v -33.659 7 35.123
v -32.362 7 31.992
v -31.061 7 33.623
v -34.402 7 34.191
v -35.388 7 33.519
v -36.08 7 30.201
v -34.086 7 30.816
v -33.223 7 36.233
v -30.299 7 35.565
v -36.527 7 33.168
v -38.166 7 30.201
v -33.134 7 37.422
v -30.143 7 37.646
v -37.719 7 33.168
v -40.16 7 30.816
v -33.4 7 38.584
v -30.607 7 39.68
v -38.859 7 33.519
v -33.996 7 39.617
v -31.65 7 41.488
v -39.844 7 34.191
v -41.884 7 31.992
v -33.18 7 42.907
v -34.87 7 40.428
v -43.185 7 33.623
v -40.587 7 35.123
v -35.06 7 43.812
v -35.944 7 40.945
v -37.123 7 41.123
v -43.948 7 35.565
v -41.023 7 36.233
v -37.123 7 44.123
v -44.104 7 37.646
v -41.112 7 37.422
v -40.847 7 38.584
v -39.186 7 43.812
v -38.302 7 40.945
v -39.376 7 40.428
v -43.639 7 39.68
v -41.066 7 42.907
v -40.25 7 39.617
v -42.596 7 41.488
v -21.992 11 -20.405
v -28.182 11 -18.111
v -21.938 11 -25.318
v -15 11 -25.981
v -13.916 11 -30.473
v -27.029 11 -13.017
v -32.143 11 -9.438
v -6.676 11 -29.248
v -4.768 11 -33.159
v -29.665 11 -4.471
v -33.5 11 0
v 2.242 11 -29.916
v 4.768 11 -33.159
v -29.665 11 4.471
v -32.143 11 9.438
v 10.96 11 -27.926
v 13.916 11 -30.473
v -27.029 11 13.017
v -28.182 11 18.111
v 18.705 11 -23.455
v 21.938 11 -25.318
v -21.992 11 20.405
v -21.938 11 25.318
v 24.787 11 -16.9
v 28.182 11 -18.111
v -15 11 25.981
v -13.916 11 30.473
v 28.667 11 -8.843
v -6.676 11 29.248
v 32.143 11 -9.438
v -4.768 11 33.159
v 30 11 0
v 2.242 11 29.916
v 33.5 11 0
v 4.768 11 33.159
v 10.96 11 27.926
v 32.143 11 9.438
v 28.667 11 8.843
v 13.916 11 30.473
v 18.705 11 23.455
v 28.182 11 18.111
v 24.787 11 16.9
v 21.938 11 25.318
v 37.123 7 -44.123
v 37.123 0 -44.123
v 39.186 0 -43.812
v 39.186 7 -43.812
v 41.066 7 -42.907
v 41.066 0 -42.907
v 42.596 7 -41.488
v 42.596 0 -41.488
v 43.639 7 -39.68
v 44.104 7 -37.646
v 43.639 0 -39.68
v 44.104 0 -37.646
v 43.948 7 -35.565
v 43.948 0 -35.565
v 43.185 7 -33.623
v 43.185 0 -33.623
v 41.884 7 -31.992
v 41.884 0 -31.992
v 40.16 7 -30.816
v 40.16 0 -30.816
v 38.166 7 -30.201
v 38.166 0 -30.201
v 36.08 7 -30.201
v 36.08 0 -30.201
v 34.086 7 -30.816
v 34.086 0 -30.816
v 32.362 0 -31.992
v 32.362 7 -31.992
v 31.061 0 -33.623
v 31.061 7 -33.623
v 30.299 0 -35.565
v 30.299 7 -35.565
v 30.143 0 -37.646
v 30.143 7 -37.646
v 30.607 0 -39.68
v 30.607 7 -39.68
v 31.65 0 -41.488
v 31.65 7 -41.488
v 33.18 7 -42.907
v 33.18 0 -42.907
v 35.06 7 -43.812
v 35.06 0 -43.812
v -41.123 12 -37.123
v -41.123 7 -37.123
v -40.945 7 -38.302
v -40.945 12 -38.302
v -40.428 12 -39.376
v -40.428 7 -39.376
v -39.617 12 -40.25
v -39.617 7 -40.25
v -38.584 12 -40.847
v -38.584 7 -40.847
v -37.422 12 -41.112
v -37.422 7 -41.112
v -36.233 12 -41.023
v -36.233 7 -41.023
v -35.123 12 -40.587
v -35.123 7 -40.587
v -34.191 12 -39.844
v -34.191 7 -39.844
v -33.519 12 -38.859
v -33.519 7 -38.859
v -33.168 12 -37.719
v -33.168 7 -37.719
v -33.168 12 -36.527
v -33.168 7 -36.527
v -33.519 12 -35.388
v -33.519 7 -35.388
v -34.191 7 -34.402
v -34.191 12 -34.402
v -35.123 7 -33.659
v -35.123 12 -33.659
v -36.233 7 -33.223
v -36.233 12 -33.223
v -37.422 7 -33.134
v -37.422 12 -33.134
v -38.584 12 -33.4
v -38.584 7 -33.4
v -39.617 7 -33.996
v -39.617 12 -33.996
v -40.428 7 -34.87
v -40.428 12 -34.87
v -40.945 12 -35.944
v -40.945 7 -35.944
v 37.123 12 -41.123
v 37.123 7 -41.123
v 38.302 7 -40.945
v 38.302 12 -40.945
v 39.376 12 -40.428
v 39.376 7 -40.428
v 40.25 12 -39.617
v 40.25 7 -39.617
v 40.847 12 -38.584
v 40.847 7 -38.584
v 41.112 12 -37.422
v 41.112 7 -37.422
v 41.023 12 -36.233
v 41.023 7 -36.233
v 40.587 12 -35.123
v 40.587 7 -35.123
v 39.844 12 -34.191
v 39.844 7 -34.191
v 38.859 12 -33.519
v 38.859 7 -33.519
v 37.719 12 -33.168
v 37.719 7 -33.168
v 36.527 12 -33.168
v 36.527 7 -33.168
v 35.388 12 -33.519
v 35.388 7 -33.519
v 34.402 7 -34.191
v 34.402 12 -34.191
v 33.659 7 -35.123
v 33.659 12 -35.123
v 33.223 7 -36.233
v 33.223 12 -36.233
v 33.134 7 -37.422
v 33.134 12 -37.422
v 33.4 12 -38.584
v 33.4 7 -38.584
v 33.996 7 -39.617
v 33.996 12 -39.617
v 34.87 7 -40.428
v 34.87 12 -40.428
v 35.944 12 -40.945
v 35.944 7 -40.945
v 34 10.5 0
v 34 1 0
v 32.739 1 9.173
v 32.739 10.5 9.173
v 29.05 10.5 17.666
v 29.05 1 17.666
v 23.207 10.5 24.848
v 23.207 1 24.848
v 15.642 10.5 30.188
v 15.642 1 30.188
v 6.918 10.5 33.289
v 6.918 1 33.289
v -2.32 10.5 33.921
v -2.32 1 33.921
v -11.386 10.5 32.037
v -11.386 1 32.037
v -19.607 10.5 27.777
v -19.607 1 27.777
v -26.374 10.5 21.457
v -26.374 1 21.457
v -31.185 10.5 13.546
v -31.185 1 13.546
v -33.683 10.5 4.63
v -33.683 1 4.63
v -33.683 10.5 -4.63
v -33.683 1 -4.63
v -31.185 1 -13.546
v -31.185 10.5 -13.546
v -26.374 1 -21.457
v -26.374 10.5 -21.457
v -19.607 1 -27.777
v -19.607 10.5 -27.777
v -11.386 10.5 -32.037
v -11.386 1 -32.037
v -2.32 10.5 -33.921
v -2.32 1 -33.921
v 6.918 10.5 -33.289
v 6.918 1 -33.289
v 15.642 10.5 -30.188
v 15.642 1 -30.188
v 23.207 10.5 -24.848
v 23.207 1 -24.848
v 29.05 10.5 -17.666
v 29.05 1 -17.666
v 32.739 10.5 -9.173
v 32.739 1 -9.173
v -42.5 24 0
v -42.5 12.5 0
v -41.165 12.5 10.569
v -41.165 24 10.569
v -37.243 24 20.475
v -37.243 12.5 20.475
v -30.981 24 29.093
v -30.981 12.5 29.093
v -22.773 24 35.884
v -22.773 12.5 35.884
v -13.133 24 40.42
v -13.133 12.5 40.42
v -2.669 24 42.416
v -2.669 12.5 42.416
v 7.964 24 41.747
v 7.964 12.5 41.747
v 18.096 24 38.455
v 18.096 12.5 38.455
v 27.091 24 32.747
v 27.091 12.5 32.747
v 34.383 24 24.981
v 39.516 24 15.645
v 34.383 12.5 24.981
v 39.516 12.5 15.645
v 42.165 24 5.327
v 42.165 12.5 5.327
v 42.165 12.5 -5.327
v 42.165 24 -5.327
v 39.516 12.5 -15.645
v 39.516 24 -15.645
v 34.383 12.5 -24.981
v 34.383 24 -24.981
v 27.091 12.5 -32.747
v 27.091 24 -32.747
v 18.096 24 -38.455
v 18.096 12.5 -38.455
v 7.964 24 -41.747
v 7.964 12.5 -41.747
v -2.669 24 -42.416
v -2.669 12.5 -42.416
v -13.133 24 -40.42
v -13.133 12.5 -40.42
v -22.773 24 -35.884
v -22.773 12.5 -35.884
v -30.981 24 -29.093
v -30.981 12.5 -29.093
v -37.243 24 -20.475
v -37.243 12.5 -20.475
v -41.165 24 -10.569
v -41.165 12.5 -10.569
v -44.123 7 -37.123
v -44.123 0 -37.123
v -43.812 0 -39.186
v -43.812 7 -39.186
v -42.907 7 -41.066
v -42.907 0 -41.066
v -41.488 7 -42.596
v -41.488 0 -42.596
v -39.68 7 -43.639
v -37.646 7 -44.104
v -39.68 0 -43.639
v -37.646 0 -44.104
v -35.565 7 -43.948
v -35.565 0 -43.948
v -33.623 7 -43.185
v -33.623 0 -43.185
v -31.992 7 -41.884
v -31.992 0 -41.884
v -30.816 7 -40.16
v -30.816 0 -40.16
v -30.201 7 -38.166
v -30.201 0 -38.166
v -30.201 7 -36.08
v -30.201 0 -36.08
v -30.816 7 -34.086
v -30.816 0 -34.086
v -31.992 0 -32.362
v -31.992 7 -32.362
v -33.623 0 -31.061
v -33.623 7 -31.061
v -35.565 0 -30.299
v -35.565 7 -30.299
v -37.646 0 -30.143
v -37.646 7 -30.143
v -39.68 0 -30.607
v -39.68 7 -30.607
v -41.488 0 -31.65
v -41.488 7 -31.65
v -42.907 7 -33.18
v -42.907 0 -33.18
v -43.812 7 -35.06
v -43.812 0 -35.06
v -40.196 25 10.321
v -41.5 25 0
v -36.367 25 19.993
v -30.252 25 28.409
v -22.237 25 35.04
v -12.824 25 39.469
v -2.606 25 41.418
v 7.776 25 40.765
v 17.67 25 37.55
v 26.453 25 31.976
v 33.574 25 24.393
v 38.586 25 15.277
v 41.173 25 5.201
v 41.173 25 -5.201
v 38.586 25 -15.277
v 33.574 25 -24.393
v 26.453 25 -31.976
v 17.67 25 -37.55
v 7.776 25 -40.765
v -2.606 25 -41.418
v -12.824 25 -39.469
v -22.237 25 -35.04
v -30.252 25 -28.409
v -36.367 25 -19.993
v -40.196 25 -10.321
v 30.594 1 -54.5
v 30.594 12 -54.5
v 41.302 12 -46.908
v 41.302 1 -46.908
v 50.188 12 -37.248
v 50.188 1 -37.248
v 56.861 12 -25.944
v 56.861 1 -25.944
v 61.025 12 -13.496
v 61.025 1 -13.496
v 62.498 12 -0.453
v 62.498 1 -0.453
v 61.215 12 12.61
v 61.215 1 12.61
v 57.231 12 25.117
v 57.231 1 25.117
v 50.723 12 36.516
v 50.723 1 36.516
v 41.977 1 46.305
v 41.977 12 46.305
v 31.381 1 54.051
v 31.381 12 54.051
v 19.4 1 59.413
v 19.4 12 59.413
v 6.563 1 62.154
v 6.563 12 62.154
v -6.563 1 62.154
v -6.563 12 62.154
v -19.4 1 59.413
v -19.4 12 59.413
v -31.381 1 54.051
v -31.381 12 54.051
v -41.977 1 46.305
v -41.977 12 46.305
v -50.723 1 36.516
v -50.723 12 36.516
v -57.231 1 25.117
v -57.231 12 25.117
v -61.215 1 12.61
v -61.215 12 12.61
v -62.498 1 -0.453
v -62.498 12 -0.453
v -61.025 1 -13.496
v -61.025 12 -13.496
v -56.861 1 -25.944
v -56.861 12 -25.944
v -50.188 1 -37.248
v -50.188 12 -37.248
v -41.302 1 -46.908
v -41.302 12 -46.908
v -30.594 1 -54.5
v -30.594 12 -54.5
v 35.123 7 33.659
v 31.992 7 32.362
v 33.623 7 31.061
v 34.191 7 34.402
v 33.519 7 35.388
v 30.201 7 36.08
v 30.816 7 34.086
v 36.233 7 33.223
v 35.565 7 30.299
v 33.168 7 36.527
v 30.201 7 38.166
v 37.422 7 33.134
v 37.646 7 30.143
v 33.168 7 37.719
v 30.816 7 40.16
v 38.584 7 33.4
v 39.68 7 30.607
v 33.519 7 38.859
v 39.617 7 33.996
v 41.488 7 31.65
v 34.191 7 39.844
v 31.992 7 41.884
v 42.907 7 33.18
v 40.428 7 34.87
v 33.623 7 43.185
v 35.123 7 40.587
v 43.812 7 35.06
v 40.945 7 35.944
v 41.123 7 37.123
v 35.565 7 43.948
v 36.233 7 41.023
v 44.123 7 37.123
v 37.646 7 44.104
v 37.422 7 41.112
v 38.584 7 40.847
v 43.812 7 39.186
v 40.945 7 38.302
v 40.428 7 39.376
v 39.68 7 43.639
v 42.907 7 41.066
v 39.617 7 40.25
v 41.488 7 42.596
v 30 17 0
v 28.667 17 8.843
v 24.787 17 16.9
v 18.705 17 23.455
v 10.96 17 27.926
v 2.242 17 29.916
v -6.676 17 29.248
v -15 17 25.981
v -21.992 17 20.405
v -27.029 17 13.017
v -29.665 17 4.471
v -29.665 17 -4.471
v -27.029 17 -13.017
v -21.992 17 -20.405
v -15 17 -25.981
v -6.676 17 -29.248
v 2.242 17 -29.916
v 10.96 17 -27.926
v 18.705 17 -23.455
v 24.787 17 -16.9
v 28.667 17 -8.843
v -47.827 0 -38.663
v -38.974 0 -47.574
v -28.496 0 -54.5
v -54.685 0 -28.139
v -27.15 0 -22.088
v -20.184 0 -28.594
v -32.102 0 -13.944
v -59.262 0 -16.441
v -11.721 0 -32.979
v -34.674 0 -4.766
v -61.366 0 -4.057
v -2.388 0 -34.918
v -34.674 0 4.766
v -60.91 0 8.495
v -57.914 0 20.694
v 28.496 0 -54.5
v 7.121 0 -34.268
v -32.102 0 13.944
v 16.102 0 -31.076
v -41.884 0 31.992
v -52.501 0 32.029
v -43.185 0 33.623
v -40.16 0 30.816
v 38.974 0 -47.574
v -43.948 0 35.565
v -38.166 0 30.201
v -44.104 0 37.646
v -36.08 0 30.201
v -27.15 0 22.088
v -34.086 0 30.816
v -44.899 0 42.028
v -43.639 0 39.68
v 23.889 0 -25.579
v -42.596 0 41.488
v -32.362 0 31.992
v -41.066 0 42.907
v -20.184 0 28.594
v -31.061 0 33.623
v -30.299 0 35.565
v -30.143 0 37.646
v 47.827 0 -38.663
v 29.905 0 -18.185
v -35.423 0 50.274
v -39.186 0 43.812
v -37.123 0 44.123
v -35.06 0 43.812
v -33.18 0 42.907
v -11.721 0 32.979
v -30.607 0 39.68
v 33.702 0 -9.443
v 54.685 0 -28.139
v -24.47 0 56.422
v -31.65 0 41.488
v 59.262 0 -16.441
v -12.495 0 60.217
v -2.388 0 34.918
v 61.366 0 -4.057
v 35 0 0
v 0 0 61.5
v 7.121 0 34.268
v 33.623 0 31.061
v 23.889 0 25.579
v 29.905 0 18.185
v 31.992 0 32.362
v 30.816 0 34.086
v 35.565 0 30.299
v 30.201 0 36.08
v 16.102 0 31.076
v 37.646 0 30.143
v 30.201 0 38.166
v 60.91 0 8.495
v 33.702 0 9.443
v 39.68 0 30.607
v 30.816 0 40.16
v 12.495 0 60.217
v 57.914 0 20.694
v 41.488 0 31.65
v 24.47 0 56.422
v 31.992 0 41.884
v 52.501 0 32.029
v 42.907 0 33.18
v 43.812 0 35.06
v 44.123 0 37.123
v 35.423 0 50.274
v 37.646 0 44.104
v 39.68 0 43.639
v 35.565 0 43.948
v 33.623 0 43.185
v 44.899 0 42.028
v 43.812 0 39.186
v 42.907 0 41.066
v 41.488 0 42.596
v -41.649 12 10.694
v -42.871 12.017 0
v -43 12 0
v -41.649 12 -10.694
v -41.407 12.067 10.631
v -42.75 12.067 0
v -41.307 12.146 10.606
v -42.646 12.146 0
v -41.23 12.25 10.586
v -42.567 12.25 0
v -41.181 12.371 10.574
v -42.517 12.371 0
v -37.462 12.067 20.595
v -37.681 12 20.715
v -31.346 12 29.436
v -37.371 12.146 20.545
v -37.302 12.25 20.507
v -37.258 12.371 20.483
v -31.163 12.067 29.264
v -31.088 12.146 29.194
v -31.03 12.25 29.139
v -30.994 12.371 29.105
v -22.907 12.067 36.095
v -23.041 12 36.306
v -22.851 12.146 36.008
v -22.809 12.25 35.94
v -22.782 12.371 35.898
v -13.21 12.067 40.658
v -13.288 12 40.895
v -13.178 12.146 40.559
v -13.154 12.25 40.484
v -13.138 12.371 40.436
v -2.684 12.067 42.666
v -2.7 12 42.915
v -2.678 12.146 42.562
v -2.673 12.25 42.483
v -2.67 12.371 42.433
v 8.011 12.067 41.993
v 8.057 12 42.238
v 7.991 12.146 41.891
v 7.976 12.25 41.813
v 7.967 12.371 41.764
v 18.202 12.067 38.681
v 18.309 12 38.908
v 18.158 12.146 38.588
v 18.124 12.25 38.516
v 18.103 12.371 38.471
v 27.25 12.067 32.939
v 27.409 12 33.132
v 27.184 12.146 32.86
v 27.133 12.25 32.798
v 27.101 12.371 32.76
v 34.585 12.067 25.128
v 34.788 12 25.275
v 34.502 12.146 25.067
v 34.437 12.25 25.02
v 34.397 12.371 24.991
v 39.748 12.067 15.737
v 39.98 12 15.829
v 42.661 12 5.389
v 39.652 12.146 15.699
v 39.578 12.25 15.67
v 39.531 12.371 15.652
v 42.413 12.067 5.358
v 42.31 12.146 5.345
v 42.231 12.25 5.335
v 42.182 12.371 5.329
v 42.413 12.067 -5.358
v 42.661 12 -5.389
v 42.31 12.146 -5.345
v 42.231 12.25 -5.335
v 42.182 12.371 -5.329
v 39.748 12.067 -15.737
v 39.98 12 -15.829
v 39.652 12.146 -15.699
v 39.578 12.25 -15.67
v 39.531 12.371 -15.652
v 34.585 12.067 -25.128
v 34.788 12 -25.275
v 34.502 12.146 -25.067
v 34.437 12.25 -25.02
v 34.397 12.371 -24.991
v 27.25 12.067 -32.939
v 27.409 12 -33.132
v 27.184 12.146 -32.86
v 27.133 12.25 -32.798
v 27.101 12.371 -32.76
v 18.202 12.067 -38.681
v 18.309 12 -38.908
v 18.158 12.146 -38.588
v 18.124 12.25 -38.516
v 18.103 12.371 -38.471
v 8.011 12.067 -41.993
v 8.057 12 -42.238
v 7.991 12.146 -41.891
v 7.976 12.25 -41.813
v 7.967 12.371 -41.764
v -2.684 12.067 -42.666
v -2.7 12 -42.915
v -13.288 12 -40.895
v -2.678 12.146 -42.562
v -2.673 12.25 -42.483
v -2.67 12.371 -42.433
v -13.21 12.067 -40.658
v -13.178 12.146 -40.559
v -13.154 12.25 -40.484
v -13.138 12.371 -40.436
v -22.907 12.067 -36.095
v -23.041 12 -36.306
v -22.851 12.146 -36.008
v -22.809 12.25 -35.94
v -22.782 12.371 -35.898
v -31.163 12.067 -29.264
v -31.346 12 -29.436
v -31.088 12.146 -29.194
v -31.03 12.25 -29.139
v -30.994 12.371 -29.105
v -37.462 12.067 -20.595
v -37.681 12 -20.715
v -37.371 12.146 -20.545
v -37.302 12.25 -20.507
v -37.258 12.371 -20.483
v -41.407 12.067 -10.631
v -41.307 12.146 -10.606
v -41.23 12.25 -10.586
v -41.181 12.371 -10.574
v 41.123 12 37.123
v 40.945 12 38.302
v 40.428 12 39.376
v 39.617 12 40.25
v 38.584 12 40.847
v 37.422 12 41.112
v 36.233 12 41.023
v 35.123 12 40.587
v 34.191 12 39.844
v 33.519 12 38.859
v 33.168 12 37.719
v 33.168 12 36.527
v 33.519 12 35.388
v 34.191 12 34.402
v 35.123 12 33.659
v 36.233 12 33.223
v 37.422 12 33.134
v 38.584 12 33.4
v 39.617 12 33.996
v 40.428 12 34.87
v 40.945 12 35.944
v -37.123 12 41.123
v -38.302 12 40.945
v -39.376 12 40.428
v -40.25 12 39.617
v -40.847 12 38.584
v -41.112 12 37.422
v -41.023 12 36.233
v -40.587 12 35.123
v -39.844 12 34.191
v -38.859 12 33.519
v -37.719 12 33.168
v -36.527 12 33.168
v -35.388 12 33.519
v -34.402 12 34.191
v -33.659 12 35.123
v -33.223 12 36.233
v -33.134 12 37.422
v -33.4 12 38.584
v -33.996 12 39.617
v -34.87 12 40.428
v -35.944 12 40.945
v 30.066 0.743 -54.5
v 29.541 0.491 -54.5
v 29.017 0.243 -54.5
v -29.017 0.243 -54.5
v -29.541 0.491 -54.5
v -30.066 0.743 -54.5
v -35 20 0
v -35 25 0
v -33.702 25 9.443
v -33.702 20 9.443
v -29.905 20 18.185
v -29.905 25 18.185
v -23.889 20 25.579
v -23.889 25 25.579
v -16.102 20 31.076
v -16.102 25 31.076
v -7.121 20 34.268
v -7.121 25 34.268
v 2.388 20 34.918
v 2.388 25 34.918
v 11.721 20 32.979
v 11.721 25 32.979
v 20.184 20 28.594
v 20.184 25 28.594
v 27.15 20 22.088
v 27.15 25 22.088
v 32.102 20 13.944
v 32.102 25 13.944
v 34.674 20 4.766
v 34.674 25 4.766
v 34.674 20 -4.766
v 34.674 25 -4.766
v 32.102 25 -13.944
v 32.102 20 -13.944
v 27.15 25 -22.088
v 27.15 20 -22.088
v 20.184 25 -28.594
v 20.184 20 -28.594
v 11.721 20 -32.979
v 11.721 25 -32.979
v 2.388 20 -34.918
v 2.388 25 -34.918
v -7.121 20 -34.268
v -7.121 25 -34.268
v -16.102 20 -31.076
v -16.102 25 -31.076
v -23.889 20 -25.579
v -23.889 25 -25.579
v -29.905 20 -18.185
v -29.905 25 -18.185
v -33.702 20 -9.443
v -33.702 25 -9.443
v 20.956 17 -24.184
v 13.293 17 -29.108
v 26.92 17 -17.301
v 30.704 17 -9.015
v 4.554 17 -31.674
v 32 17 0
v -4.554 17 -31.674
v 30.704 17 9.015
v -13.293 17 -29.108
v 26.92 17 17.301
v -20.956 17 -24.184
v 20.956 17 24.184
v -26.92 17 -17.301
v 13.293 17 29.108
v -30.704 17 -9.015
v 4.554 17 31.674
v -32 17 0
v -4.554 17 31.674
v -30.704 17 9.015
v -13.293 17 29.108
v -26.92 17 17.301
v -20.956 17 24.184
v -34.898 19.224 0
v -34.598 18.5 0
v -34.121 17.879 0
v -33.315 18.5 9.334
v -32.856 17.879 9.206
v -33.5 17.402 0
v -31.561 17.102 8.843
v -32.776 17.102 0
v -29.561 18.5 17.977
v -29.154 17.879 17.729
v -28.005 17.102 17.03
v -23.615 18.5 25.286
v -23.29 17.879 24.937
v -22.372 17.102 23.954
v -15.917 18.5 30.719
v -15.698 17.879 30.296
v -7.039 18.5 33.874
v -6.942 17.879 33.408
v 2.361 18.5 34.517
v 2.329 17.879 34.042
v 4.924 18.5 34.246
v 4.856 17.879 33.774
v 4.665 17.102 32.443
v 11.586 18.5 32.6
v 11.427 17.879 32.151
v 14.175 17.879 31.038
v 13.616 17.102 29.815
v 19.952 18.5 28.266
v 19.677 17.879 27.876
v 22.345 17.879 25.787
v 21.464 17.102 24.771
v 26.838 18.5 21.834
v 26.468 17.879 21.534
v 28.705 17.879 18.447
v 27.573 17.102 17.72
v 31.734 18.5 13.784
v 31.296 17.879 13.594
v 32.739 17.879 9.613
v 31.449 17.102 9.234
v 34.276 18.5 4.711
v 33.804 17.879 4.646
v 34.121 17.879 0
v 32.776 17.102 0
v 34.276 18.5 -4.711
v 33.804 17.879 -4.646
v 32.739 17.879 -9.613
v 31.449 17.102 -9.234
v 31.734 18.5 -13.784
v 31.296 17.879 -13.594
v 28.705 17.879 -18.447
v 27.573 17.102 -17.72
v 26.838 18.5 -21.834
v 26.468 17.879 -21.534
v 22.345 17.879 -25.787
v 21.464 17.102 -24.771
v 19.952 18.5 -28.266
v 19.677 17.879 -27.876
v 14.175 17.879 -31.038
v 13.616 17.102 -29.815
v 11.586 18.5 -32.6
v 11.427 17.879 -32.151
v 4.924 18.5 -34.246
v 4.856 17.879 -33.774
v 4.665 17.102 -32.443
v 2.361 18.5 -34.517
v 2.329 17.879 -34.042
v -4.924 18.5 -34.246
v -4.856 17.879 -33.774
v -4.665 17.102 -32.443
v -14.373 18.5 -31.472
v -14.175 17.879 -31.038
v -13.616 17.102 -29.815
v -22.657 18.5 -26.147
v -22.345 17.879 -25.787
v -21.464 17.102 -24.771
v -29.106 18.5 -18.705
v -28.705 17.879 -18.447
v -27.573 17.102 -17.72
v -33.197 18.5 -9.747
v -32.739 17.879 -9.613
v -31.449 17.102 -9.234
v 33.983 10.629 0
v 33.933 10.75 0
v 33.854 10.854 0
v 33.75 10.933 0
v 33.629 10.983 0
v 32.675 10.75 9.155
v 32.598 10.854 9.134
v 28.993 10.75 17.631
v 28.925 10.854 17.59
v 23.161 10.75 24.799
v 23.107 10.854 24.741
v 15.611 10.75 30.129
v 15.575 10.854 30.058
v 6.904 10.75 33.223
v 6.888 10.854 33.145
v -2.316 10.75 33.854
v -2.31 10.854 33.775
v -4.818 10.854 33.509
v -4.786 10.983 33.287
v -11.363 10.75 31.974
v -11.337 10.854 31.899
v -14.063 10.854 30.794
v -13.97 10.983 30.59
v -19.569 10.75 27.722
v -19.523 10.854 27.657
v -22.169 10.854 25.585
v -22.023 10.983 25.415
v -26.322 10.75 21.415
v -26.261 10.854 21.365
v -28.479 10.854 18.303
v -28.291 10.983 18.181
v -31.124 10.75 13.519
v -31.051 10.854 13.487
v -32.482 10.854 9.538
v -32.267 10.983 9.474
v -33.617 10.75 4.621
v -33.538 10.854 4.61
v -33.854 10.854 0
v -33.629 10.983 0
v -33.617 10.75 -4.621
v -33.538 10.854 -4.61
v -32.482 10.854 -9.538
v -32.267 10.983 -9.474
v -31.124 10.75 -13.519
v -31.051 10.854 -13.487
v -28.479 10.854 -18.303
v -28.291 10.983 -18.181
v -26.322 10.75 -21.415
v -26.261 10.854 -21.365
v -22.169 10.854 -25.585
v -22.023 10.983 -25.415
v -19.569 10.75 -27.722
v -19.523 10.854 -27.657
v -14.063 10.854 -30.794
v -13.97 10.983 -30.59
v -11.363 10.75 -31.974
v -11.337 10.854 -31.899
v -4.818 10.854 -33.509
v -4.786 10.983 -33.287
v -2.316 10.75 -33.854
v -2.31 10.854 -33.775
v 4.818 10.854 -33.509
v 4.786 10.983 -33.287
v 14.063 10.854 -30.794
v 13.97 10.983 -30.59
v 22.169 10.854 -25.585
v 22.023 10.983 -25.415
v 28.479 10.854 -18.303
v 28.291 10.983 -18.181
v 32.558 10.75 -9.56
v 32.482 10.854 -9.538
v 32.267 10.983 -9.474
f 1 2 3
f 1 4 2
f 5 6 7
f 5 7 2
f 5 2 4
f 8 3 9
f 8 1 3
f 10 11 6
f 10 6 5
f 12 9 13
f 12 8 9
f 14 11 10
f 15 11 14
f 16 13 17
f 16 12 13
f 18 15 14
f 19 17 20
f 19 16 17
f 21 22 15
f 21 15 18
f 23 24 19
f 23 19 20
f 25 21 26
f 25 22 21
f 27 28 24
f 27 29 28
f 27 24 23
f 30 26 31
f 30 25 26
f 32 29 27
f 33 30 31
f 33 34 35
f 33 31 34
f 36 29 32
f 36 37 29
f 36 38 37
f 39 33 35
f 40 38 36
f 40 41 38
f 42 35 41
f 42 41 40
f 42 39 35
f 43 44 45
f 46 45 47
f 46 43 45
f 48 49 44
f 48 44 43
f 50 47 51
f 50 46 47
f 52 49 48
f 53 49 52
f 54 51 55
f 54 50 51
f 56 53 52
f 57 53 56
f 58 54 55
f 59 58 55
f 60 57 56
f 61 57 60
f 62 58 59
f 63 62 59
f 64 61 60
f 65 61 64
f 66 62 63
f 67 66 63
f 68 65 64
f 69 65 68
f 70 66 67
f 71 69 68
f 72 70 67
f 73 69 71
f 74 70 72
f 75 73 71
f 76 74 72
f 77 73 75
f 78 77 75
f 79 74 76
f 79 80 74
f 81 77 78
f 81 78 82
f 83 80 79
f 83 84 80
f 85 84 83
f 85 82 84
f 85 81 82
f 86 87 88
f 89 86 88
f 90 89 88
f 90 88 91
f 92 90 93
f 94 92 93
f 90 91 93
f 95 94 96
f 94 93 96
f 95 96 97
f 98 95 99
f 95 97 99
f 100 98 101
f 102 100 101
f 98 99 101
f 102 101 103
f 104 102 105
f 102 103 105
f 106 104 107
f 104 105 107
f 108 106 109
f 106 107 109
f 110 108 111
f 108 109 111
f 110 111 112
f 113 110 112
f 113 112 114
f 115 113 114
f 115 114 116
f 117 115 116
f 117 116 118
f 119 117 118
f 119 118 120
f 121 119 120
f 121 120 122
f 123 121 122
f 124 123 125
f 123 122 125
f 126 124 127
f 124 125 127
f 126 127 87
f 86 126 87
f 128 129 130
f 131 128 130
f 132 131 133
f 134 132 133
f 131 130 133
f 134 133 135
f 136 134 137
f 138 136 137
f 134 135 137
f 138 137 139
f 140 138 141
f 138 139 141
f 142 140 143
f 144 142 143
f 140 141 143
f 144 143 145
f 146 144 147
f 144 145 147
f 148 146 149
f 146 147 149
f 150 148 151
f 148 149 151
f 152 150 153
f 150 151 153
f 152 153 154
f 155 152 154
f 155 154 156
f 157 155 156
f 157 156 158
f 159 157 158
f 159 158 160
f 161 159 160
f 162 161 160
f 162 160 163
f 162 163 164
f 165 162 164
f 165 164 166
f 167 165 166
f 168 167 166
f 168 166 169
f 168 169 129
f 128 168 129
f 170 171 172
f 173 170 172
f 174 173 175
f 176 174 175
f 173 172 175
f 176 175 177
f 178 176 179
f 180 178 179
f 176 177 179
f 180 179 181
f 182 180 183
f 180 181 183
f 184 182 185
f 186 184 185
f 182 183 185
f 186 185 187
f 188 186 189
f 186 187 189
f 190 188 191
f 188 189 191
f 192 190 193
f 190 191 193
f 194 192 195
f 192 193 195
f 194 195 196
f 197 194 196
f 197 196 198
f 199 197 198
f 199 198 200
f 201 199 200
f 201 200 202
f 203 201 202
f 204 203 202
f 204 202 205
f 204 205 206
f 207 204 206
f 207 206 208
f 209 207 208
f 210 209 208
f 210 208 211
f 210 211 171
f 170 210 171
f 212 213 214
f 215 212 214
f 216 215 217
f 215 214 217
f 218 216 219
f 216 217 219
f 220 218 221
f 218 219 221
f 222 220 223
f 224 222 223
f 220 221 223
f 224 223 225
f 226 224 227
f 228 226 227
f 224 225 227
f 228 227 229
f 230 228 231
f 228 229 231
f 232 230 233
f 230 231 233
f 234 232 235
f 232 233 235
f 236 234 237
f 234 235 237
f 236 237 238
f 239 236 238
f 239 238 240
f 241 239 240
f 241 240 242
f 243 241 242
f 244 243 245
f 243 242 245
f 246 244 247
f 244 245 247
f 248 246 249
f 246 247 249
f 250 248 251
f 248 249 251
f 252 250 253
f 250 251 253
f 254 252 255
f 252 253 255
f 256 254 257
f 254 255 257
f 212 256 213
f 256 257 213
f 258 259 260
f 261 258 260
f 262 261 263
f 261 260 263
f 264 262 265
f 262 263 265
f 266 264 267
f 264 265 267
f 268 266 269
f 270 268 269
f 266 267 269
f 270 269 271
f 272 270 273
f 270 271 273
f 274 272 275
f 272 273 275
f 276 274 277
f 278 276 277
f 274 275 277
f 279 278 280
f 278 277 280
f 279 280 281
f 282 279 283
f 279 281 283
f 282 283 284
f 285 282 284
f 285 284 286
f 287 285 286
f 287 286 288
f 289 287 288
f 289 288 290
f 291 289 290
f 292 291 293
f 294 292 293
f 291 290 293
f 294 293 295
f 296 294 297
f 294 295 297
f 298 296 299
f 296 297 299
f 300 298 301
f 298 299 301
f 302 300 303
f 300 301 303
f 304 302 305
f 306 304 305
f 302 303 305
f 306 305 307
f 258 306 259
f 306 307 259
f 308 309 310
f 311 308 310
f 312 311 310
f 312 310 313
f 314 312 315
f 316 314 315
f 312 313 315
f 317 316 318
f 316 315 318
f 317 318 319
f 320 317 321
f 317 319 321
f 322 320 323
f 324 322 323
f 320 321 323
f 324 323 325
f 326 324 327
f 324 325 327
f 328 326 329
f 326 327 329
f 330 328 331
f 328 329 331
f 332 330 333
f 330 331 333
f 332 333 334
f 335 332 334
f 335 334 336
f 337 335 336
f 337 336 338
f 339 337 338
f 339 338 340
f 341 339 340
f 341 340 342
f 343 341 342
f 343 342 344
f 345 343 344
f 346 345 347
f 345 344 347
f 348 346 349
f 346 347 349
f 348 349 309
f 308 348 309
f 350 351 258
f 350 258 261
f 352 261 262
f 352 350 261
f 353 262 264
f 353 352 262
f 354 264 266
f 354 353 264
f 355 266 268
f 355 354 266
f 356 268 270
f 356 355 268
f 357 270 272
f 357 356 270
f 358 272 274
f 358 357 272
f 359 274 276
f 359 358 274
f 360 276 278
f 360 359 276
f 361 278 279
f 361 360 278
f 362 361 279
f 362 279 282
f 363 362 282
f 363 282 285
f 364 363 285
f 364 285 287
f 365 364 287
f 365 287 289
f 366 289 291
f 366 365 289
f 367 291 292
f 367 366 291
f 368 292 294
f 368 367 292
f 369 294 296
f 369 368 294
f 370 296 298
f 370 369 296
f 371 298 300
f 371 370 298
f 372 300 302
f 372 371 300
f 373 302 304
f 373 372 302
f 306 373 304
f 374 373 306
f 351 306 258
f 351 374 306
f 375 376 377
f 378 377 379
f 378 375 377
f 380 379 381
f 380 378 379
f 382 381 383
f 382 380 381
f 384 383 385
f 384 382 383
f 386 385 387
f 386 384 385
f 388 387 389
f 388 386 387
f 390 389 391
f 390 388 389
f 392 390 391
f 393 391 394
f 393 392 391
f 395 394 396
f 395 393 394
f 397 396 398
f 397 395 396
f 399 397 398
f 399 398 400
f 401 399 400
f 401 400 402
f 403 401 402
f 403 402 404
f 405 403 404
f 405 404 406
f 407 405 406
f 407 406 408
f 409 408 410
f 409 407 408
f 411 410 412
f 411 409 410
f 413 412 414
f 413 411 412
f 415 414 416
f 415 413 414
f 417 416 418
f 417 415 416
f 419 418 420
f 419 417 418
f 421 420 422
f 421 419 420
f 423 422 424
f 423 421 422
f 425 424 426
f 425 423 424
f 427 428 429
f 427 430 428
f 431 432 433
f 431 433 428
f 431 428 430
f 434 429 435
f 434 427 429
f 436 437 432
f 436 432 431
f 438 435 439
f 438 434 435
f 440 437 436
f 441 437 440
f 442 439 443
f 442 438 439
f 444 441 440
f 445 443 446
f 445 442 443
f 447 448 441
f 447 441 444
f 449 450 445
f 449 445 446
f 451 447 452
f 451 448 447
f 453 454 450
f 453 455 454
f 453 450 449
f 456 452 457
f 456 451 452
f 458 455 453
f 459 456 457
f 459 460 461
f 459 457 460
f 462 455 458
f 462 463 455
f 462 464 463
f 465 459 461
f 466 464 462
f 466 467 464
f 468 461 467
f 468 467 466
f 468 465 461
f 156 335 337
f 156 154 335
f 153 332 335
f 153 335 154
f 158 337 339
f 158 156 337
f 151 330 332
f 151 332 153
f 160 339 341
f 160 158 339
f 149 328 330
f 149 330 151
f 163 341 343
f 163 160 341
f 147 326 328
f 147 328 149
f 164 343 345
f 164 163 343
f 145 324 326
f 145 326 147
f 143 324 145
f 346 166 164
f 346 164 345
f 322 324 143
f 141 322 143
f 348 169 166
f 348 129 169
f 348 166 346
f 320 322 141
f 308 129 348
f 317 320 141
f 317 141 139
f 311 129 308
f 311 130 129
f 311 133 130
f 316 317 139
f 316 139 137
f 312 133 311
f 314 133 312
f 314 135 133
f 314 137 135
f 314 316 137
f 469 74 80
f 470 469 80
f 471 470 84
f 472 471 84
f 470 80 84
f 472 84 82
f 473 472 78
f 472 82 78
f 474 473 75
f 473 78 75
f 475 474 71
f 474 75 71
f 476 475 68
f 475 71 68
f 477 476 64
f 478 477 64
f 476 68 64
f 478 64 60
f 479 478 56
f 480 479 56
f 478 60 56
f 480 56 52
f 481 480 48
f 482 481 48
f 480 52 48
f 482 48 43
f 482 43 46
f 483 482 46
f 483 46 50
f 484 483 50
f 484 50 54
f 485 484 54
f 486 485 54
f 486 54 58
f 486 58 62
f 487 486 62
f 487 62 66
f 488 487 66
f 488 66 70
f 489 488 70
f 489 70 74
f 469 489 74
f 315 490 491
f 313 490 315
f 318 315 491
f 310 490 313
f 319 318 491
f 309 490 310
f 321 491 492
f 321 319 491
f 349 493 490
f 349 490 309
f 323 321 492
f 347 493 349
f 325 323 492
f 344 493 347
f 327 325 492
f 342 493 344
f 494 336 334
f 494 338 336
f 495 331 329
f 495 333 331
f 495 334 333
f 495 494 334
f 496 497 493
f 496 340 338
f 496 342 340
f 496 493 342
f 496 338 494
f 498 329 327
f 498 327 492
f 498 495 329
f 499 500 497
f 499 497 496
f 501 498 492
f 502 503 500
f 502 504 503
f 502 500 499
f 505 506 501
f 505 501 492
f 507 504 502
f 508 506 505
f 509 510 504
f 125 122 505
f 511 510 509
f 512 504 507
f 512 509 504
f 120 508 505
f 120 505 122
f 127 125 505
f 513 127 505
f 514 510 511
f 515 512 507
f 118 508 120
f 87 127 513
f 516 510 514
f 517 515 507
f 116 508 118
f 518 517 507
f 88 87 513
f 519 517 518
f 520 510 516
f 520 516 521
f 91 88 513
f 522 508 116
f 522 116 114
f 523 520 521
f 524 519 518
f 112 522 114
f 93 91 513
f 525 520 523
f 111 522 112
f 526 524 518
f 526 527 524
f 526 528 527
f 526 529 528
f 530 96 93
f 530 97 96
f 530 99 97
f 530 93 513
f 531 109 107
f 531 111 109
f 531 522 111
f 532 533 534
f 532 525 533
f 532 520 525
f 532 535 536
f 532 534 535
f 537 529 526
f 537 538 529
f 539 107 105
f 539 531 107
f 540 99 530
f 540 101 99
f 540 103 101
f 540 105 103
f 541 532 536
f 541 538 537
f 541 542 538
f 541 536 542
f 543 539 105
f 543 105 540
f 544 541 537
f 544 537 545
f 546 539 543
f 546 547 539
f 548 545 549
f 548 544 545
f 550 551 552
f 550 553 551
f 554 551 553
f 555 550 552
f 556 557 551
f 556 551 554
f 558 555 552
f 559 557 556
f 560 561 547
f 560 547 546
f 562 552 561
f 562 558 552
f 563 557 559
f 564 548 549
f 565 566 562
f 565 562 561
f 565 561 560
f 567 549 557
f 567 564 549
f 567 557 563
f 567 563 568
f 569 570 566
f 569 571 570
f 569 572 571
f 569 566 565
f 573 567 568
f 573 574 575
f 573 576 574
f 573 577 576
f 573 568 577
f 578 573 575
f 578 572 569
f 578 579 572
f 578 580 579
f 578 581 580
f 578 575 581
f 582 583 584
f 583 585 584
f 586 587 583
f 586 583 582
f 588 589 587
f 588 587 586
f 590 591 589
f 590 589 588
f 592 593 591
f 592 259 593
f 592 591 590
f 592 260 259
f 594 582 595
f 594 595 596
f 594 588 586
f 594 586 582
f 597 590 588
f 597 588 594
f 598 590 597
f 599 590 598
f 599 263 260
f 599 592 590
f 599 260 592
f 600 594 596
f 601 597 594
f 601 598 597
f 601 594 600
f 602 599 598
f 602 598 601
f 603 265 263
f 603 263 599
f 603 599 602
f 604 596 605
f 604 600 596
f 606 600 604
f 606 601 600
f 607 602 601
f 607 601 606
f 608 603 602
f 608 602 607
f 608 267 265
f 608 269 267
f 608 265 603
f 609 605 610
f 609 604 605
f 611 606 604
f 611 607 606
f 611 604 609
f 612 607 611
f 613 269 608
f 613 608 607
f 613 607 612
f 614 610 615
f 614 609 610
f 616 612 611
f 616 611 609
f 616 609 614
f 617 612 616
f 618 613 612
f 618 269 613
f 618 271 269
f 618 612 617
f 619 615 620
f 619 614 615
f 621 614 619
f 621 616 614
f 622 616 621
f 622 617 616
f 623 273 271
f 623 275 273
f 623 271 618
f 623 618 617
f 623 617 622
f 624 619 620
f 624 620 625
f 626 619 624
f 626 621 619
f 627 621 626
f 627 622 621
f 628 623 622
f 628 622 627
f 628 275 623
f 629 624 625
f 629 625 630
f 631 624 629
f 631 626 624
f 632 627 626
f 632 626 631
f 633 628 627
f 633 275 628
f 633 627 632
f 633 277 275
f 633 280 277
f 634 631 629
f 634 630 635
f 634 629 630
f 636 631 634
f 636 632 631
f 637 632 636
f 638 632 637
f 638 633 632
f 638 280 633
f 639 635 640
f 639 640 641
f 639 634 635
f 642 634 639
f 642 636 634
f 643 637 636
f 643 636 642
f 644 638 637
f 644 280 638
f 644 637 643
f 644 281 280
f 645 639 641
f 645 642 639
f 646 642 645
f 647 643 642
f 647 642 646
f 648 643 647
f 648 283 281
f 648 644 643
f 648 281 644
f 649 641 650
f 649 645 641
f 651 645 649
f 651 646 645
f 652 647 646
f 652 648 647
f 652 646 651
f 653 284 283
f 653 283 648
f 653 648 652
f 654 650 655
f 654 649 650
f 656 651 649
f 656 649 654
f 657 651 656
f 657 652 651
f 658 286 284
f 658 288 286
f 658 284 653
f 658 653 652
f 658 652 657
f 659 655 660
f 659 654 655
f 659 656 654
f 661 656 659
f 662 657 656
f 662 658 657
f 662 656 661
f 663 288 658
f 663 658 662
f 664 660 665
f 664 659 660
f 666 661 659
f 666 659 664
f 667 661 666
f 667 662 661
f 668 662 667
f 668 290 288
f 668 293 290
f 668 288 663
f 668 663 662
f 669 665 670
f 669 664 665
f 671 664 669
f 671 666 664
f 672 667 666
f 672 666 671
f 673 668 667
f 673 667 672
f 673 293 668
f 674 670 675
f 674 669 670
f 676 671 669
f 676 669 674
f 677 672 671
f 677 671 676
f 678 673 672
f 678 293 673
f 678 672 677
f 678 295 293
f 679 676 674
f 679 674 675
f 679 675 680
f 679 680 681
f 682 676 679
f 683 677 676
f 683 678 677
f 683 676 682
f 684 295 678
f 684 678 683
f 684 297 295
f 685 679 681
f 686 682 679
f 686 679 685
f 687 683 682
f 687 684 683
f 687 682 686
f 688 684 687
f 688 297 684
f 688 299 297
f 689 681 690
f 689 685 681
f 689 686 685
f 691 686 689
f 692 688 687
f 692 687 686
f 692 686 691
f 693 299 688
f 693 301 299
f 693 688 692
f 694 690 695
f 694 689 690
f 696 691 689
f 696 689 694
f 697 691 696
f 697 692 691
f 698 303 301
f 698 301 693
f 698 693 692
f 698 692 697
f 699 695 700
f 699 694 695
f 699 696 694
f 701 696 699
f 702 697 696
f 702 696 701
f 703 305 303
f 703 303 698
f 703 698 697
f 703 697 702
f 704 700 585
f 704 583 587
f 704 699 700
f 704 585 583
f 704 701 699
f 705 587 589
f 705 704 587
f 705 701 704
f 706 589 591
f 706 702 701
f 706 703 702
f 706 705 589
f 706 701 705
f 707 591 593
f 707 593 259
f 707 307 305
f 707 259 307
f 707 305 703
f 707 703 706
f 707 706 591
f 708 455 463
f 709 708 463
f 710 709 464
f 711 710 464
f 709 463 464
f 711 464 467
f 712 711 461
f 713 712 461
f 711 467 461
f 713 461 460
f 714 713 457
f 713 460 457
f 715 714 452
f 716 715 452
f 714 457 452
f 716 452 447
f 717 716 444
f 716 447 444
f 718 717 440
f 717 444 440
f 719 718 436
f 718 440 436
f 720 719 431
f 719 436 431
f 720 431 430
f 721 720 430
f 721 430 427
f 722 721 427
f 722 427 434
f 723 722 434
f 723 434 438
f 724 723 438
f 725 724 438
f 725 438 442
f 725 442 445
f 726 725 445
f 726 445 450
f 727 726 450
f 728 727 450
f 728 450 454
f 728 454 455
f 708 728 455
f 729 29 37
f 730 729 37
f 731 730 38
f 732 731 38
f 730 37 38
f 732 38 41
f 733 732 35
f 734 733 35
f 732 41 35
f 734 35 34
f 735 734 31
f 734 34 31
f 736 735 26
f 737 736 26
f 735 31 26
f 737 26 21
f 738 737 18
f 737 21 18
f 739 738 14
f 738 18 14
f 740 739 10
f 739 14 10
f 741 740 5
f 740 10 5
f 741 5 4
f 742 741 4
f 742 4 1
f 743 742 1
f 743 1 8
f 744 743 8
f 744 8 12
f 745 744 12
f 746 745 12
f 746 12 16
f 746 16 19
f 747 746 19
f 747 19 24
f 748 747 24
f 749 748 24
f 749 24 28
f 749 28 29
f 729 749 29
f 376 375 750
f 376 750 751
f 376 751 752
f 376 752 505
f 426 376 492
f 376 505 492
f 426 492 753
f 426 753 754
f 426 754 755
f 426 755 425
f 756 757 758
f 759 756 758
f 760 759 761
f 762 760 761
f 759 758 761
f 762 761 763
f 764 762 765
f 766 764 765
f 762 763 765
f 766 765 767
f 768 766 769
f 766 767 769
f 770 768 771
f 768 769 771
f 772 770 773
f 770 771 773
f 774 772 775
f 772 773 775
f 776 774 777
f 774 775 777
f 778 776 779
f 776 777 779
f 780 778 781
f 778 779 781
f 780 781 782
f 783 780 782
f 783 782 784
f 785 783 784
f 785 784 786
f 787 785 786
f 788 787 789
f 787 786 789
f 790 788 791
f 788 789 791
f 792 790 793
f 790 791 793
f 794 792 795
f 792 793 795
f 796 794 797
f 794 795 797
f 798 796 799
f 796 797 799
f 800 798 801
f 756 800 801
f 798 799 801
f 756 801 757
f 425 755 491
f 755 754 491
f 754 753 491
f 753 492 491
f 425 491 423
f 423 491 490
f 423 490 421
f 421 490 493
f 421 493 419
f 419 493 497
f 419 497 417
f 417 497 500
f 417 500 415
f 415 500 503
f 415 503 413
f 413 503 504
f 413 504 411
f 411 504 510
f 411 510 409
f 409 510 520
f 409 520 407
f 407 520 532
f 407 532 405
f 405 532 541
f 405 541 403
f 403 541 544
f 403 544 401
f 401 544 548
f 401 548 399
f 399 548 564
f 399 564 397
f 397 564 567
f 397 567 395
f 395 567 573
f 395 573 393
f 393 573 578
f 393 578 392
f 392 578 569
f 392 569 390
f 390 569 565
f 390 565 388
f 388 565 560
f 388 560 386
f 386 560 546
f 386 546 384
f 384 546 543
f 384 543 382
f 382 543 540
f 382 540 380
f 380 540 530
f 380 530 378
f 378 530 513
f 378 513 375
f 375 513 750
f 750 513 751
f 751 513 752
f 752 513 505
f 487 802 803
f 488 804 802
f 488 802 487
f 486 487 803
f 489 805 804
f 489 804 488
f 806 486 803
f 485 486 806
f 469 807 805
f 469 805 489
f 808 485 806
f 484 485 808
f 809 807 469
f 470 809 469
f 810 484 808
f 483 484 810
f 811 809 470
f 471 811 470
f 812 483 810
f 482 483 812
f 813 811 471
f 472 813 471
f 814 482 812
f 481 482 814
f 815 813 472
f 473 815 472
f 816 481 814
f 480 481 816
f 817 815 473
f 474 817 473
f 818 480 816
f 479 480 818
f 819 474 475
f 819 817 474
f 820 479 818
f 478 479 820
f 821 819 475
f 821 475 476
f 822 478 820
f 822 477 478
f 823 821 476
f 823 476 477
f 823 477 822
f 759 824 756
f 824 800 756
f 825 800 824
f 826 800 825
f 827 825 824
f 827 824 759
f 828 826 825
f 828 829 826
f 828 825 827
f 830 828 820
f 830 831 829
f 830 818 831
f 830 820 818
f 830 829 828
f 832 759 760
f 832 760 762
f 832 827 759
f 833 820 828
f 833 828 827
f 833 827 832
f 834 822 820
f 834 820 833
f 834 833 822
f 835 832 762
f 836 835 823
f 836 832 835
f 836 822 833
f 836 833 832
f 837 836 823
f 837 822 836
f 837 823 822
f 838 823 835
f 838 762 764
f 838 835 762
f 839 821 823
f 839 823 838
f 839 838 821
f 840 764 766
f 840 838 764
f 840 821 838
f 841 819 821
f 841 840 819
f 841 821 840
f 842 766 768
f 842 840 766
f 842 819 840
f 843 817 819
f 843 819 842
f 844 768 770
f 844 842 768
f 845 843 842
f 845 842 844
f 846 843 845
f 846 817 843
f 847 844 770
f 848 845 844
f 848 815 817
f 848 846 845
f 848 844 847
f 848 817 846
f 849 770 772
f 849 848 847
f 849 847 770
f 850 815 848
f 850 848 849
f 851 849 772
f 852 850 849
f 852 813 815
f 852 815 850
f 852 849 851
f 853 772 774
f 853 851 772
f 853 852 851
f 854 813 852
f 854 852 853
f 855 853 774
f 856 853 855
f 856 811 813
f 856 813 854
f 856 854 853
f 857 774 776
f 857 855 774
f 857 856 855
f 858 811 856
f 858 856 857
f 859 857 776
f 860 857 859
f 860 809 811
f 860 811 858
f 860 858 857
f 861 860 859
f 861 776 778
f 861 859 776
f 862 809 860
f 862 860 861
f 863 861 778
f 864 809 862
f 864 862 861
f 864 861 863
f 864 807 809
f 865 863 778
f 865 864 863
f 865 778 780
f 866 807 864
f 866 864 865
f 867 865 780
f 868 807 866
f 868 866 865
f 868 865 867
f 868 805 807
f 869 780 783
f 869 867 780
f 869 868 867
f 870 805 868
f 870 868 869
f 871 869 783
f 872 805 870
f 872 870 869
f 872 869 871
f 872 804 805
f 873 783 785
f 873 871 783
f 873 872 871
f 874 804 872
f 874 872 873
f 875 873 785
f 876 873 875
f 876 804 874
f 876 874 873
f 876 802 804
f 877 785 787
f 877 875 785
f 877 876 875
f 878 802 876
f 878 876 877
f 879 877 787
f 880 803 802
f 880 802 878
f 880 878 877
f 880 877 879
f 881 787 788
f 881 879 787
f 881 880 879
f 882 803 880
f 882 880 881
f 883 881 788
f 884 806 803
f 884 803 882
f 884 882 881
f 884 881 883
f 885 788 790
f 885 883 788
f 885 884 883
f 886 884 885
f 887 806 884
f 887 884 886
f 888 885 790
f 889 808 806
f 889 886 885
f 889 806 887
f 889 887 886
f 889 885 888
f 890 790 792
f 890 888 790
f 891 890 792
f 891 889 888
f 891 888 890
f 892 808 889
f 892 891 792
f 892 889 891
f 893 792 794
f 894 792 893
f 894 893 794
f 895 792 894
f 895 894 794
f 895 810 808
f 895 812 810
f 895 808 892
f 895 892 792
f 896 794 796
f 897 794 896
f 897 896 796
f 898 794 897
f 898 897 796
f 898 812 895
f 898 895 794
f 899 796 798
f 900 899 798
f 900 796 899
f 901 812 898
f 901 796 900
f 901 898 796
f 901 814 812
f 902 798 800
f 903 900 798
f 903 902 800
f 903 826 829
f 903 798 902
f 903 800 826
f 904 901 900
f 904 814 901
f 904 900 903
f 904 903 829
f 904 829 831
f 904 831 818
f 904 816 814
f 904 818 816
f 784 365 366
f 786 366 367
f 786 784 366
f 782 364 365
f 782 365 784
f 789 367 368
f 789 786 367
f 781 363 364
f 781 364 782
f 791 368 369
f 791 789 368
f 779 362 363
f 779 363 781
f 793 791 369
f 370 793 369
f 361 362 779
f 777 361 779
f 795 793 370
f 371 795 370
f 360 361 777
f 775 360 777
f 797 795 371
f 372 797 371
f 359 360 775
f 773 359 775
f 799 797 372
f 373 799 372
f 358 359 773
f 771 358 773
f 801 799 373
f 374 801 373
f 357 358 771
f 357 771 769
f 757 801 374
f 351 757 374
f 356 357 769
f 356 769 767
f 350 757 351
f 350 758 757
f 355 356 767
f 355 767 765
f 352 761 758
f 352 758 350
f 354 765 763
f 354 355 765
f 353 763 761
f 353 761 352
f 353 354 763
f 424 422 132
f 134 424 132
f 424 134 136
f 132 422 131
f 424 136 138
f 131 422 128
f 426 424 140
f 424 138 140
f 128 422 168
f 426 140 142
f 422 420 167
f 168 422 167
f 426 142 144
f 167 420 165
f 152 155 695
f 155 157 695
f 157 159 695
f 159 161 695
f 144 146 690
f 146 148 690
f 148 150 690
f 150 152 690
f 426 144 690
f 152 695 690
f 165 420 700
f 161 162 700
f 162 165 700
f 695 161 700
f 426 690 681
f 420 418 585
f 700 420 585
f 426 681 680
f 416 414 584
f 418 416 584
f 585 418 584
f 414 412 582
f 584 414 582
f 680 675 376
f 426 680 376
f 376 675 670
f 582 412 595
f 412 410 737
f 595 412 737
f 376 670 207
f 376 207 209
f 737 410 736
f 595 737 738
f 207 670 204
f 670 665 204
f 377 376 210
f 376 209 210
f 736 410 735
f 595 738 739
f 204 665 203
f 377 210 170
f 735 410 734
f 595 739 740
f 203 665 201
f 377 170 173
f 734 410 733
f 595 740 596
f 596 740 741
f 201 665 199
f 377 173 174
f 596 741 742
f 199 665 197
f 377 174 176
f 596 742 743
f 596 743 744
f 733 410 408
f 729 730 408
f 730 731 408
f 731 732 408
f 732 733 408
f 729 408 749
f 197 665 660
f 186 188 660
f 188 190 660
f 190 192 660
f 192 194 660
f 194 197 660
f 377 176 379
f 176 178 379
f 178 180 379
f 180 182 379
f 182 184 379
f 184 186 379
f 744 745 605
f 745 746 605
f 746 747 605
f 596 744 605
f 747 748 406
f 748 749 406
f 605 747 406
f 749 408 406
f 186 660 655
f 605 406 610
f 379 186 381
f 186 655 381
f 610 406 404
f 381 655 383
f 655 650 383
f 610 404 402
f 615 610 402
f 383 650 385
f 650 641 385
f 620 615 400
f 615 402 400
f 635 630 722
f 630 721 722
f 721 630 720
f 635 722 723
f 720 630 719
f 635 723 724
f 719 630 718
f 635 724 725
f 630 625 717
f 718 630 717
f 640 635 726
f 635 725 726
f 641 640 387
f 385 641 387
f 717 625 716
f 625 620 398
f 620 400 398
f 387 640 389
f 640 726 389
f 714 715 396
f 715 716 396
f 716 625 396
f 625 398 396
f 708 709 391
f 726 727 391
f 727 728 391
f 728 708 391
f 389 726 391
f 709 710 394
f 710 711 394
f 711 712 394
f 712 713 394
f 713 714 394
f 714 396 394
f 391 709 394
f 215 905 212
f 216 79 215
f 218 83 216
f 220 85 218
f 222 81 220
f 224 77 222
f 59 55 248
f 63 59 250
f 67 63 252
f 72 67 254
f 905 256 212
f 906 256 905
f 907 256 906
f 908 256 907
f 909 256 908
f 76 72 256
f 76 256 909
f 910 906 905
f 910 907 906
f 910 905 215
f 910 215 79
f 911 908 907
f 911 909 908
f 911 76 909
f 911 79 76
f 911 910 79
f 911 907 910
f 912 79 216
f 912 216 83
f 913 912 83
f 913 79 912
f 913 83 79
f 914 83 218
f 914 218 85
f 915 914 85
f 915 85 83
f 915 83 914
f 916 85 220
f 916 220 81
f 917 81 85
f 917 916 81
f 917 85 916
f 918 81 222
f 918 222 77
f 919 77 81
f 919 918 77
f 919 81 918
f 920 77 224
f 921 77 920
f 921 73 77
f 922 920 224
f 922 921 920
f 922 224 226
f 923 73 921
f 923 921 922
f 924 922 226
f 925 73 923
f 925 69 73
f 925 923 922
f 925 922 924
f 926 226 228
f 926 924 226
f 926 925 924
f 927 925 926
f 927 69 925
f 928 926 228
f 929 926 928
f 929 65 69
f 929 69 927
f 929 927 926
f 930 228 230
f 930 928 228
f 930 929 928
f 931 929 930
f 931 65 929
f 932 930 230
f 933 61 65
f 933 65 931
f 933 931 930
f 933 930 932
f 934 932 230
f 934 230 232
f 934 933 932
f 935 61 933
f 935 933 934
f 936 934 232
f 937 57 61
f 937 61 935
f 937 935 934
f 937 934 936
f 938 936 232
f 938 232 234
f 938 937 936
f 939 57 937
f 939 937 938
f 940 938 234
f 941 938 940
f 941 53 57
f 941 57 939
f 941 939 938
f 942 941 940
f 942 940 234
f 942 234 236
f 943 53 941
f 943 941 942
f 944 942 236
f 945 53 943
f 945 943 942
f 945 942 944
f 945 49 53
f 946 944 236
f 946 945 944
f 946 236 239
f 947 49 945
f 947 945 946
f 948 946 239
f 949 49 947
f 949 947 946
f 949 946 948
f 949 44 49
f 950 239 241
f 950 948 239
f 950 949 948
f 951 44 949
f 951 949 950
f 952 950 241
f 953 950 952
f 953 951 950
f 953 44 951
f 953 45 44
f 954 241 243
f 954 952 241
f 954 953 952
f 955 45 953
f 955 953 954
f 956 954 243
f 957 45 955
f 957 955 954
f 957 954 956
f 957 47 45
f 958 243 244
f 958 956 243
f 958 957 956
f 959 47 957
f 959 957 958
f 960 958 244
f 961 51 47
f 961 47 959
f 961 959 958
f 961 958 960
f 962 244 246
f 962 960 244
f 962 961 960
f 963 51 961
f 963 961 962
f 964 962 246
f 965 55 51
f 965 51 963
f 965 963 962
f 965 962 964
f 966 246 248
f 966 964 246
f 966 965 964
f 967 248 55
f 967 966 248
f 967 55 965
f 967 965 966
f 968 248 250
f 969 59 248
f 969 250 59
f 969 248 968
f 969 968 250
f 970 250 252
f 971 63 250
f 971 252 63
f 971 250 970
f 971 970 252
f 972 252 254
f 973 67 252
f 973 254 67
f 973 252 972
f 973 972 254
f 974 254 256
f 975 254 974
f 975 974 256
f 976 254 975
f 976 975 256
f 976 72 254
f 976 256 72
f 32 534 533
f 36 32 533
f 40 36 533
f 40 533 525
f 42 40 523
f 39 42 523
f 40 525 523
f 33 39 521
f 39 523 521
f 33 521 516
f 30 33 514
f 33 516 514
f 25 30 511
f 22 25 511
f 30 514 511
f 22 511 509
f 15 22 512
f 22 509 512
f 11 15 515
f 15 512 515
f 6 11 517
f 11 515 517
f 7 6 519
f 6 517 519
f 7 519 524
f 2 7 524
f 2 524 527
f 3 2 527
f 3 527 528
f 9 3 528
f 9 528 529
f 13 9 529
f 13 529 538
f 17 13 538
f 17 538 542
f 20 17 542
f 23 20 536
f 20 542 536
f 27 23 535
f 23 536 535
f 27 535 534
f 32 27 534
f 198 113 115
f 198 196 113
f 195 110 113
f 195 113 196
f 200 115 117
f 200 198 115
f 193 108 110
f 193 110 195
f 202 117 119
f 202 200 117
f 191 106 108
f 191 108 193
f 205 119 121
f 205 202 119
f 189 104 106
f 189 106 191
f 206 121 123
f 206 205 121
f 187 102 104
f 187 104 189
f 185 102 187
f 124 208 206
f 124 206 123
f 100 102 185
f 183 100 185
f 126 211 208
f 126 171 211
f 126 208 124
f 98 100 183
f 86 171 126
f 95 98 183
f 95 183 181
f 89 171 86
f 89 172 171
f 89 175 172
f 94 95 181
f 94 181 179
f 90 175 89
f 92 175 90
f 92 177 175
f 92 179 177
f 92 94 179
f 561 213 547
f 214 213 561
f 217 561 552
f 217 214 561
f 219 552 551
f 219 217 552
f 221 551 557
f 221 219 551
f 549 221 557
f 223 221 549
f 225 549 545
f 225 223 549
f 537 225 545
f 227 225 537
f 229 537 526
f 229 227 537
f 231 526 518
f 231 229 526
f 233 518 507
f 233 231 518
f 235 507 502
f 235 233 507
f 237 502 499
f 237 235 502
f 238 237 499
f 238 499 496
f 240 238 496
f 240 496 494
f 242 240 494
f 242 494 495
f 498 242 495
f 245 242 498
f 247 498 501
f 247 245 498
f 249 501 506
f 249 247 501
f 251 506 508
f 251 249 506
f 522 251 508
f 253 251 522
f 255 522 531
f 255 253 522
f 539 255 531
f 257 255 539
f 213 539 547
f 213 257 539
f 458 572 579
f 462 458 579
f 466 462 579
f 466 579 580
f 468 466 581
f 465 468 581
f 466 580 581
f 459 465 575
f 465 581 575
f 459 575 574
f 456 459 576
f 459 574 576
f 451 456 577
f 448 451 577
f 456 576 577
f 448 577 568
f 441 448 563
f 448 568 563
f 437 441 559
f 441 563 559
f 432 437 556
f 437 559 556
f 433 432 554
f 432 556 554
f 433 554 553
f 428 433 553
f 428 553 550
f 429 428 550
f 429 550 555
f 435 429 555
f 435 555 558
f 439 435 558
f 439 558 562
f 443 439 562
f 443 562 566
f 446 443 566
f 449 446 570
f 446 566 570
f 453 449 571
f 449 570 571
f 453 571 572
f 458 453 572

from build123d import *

# Parameters (mm, degrees)
F0_R            = 62.5
F1_DEPTH        = 12
F2_R            = 7
F3_DEPTH        = 7
F3_COPIES_COUNT = 4
F4_R            = 4
F5_DEPTH        = 25
F5_COPIES_COUNT = 4
F7_DEPTH        = 25
F8_R            = 42.5
F9_DEPTH        = 13
F10_R           = 35
F11_DEPTH       = 8
F12_R           = 34
F13_DEPTH       = 11
F14_R           = 30
F15_DEPTH       = 25
F16_SIZE        = 1
F17_R           = 0.5
F18_R           = 3


# Not quite as in the source:
# - a pattern or mirror of a feature is missing from the dataset's text; its kind, count and spacing are read off the source's solid


with BuildPart() as f1:
    # F0 (on Front) → F1 (new body)
    with BuildSketch(Plane.XZ):
        Circle(F0_R)
    extrude(amount=-F1_DEPTH)

    # F2 (on face) → F3 (cut)
    with BuildSketch(Plane.XZ):
        with Locations((37.1231060123, 37.1231060123)):
            Circle(F2_R)
    f3 = extrude(amount=-F3_DEPTH, mode=Mode.SUBTRACT)

    # F3_copies: F3 ×4 about axis
    f3_copies_axis = Axis((0, 0, 0), (0, 1, 0))
    for i in range(1, F3_COPIES_COUNT):
        add(f3.rotate(f3_copies_axis, i * 360 / F3_COPIES_COUNT), mode=Mode.SUBTRACT)

    # F4 (on face) → F5 (cut)
    with BuildSketch(Plane.XZ.offset(-7)):
        with Locations((37.1231060123, 37.1231060123)):
            Circle(F4_R)
    f5 = extrude(amount=-F5_DEPTH, mode=Mode.SUBTRACT)

    # F5_copies: F5 ×4 about axis
    f5_copies_axis = Axis((0, 0, 0), (0, 1, 0))
    for i in range(1, F5_COPIES_COUNT):
        add(f5.rotate(f5_copies_axis, i * 360 / F5_COPIES_COUNT), mode=Mode.SUBTRACT)

    # F6 (on face) → F7 (cut)
    with BuildSketch(Plane.XZ):
        with BuildLine():
            Line((30.5941170816, -54.5), (-30.5941170816, -54.5))
            ThreePointArc((-30.5941170816, -54.5), (0, -62.5), (30.5941170816, -54.5))
        make_face()
    extrude(amount=-F7_DEPTH, mode=Mode.SUBTRACT)

    # F8 (on face) → F9 (join)
    with BuildSketch(Plane(origin=(0, 12, 0), x_dir=(-1, 0, 0), z_dir=(0, 1, 0))):
        Circle(F8_R)
    extrude(amount=F9_DEPTH)

    # F10 (on face) → F11 (cut)
    with BuildSketch(Plane(origin=(0, 25, 0), x_dir=(-1, 0, 0), z_dir=(0, 1, 0))):
        Circle(F10_R)
    extrude(amount=-F11_DEPTH, mode=Mode.SUBTRACT)

    # F12 (on face) → F13 (cut)
    with BuildSketch(Plane.XZ):
        Circle(F12_R)
    extrude(amount=-F13_DEPTH, mode=Mode.SUBTRACT)

    # F14 (on face) → F15 (cut)
    with BuildSketch(Plane.XZ.offset(-11)):
        Circle(F14_R)
    extrude(amount=-F15_DEPTH, mode=Mode.SUBTRACT)

    # F16
    f16_edges = [f1.edges().sort_by_distance(p)[0] for p in [
        (0, 0, 62.5),
        (-34, 0, 0),
        (42.5, 25, 0),
    ]]
    chamfer(f16_edges, length=F16_SIZE)

    # F17
    f17_edges = [f1.edges().sort_by_distance(p)[0] for p in [
        (-34, 11, 0),
        (42.5, 12, 0),
    ]]
    fillet(f17_edges, radius=F17_R)

    # F18
    f18_edges = [f1.edges().sort_by_distance(p)[0] for p in [
        (35, 17, 0),
    ]]
    fillet(f18_edges, radius=F18_R)


with BuildPart() as f20:
    # F19 (on Top) → F20 (revolve)
    with BuildSketch(Plane.XY):
        with BuildLine():
            Line((23, 17), (23, 0))
            Line((23, 0), (34, 0))
            Line((34, 0), (34, 10.5))
            ThreePointArc((34, 10.5), (33.8535533906, 10.8535533906), (33.5, 11))
            Line((33.5, 11), (30, 11))
            Line((30, 11), (30, 17))
            Line((30, 17), (23, 17))
        make_face()
    revolve(axis=Axis((0, 0, 0), (0, -1, 0)))


solid = f1.part
